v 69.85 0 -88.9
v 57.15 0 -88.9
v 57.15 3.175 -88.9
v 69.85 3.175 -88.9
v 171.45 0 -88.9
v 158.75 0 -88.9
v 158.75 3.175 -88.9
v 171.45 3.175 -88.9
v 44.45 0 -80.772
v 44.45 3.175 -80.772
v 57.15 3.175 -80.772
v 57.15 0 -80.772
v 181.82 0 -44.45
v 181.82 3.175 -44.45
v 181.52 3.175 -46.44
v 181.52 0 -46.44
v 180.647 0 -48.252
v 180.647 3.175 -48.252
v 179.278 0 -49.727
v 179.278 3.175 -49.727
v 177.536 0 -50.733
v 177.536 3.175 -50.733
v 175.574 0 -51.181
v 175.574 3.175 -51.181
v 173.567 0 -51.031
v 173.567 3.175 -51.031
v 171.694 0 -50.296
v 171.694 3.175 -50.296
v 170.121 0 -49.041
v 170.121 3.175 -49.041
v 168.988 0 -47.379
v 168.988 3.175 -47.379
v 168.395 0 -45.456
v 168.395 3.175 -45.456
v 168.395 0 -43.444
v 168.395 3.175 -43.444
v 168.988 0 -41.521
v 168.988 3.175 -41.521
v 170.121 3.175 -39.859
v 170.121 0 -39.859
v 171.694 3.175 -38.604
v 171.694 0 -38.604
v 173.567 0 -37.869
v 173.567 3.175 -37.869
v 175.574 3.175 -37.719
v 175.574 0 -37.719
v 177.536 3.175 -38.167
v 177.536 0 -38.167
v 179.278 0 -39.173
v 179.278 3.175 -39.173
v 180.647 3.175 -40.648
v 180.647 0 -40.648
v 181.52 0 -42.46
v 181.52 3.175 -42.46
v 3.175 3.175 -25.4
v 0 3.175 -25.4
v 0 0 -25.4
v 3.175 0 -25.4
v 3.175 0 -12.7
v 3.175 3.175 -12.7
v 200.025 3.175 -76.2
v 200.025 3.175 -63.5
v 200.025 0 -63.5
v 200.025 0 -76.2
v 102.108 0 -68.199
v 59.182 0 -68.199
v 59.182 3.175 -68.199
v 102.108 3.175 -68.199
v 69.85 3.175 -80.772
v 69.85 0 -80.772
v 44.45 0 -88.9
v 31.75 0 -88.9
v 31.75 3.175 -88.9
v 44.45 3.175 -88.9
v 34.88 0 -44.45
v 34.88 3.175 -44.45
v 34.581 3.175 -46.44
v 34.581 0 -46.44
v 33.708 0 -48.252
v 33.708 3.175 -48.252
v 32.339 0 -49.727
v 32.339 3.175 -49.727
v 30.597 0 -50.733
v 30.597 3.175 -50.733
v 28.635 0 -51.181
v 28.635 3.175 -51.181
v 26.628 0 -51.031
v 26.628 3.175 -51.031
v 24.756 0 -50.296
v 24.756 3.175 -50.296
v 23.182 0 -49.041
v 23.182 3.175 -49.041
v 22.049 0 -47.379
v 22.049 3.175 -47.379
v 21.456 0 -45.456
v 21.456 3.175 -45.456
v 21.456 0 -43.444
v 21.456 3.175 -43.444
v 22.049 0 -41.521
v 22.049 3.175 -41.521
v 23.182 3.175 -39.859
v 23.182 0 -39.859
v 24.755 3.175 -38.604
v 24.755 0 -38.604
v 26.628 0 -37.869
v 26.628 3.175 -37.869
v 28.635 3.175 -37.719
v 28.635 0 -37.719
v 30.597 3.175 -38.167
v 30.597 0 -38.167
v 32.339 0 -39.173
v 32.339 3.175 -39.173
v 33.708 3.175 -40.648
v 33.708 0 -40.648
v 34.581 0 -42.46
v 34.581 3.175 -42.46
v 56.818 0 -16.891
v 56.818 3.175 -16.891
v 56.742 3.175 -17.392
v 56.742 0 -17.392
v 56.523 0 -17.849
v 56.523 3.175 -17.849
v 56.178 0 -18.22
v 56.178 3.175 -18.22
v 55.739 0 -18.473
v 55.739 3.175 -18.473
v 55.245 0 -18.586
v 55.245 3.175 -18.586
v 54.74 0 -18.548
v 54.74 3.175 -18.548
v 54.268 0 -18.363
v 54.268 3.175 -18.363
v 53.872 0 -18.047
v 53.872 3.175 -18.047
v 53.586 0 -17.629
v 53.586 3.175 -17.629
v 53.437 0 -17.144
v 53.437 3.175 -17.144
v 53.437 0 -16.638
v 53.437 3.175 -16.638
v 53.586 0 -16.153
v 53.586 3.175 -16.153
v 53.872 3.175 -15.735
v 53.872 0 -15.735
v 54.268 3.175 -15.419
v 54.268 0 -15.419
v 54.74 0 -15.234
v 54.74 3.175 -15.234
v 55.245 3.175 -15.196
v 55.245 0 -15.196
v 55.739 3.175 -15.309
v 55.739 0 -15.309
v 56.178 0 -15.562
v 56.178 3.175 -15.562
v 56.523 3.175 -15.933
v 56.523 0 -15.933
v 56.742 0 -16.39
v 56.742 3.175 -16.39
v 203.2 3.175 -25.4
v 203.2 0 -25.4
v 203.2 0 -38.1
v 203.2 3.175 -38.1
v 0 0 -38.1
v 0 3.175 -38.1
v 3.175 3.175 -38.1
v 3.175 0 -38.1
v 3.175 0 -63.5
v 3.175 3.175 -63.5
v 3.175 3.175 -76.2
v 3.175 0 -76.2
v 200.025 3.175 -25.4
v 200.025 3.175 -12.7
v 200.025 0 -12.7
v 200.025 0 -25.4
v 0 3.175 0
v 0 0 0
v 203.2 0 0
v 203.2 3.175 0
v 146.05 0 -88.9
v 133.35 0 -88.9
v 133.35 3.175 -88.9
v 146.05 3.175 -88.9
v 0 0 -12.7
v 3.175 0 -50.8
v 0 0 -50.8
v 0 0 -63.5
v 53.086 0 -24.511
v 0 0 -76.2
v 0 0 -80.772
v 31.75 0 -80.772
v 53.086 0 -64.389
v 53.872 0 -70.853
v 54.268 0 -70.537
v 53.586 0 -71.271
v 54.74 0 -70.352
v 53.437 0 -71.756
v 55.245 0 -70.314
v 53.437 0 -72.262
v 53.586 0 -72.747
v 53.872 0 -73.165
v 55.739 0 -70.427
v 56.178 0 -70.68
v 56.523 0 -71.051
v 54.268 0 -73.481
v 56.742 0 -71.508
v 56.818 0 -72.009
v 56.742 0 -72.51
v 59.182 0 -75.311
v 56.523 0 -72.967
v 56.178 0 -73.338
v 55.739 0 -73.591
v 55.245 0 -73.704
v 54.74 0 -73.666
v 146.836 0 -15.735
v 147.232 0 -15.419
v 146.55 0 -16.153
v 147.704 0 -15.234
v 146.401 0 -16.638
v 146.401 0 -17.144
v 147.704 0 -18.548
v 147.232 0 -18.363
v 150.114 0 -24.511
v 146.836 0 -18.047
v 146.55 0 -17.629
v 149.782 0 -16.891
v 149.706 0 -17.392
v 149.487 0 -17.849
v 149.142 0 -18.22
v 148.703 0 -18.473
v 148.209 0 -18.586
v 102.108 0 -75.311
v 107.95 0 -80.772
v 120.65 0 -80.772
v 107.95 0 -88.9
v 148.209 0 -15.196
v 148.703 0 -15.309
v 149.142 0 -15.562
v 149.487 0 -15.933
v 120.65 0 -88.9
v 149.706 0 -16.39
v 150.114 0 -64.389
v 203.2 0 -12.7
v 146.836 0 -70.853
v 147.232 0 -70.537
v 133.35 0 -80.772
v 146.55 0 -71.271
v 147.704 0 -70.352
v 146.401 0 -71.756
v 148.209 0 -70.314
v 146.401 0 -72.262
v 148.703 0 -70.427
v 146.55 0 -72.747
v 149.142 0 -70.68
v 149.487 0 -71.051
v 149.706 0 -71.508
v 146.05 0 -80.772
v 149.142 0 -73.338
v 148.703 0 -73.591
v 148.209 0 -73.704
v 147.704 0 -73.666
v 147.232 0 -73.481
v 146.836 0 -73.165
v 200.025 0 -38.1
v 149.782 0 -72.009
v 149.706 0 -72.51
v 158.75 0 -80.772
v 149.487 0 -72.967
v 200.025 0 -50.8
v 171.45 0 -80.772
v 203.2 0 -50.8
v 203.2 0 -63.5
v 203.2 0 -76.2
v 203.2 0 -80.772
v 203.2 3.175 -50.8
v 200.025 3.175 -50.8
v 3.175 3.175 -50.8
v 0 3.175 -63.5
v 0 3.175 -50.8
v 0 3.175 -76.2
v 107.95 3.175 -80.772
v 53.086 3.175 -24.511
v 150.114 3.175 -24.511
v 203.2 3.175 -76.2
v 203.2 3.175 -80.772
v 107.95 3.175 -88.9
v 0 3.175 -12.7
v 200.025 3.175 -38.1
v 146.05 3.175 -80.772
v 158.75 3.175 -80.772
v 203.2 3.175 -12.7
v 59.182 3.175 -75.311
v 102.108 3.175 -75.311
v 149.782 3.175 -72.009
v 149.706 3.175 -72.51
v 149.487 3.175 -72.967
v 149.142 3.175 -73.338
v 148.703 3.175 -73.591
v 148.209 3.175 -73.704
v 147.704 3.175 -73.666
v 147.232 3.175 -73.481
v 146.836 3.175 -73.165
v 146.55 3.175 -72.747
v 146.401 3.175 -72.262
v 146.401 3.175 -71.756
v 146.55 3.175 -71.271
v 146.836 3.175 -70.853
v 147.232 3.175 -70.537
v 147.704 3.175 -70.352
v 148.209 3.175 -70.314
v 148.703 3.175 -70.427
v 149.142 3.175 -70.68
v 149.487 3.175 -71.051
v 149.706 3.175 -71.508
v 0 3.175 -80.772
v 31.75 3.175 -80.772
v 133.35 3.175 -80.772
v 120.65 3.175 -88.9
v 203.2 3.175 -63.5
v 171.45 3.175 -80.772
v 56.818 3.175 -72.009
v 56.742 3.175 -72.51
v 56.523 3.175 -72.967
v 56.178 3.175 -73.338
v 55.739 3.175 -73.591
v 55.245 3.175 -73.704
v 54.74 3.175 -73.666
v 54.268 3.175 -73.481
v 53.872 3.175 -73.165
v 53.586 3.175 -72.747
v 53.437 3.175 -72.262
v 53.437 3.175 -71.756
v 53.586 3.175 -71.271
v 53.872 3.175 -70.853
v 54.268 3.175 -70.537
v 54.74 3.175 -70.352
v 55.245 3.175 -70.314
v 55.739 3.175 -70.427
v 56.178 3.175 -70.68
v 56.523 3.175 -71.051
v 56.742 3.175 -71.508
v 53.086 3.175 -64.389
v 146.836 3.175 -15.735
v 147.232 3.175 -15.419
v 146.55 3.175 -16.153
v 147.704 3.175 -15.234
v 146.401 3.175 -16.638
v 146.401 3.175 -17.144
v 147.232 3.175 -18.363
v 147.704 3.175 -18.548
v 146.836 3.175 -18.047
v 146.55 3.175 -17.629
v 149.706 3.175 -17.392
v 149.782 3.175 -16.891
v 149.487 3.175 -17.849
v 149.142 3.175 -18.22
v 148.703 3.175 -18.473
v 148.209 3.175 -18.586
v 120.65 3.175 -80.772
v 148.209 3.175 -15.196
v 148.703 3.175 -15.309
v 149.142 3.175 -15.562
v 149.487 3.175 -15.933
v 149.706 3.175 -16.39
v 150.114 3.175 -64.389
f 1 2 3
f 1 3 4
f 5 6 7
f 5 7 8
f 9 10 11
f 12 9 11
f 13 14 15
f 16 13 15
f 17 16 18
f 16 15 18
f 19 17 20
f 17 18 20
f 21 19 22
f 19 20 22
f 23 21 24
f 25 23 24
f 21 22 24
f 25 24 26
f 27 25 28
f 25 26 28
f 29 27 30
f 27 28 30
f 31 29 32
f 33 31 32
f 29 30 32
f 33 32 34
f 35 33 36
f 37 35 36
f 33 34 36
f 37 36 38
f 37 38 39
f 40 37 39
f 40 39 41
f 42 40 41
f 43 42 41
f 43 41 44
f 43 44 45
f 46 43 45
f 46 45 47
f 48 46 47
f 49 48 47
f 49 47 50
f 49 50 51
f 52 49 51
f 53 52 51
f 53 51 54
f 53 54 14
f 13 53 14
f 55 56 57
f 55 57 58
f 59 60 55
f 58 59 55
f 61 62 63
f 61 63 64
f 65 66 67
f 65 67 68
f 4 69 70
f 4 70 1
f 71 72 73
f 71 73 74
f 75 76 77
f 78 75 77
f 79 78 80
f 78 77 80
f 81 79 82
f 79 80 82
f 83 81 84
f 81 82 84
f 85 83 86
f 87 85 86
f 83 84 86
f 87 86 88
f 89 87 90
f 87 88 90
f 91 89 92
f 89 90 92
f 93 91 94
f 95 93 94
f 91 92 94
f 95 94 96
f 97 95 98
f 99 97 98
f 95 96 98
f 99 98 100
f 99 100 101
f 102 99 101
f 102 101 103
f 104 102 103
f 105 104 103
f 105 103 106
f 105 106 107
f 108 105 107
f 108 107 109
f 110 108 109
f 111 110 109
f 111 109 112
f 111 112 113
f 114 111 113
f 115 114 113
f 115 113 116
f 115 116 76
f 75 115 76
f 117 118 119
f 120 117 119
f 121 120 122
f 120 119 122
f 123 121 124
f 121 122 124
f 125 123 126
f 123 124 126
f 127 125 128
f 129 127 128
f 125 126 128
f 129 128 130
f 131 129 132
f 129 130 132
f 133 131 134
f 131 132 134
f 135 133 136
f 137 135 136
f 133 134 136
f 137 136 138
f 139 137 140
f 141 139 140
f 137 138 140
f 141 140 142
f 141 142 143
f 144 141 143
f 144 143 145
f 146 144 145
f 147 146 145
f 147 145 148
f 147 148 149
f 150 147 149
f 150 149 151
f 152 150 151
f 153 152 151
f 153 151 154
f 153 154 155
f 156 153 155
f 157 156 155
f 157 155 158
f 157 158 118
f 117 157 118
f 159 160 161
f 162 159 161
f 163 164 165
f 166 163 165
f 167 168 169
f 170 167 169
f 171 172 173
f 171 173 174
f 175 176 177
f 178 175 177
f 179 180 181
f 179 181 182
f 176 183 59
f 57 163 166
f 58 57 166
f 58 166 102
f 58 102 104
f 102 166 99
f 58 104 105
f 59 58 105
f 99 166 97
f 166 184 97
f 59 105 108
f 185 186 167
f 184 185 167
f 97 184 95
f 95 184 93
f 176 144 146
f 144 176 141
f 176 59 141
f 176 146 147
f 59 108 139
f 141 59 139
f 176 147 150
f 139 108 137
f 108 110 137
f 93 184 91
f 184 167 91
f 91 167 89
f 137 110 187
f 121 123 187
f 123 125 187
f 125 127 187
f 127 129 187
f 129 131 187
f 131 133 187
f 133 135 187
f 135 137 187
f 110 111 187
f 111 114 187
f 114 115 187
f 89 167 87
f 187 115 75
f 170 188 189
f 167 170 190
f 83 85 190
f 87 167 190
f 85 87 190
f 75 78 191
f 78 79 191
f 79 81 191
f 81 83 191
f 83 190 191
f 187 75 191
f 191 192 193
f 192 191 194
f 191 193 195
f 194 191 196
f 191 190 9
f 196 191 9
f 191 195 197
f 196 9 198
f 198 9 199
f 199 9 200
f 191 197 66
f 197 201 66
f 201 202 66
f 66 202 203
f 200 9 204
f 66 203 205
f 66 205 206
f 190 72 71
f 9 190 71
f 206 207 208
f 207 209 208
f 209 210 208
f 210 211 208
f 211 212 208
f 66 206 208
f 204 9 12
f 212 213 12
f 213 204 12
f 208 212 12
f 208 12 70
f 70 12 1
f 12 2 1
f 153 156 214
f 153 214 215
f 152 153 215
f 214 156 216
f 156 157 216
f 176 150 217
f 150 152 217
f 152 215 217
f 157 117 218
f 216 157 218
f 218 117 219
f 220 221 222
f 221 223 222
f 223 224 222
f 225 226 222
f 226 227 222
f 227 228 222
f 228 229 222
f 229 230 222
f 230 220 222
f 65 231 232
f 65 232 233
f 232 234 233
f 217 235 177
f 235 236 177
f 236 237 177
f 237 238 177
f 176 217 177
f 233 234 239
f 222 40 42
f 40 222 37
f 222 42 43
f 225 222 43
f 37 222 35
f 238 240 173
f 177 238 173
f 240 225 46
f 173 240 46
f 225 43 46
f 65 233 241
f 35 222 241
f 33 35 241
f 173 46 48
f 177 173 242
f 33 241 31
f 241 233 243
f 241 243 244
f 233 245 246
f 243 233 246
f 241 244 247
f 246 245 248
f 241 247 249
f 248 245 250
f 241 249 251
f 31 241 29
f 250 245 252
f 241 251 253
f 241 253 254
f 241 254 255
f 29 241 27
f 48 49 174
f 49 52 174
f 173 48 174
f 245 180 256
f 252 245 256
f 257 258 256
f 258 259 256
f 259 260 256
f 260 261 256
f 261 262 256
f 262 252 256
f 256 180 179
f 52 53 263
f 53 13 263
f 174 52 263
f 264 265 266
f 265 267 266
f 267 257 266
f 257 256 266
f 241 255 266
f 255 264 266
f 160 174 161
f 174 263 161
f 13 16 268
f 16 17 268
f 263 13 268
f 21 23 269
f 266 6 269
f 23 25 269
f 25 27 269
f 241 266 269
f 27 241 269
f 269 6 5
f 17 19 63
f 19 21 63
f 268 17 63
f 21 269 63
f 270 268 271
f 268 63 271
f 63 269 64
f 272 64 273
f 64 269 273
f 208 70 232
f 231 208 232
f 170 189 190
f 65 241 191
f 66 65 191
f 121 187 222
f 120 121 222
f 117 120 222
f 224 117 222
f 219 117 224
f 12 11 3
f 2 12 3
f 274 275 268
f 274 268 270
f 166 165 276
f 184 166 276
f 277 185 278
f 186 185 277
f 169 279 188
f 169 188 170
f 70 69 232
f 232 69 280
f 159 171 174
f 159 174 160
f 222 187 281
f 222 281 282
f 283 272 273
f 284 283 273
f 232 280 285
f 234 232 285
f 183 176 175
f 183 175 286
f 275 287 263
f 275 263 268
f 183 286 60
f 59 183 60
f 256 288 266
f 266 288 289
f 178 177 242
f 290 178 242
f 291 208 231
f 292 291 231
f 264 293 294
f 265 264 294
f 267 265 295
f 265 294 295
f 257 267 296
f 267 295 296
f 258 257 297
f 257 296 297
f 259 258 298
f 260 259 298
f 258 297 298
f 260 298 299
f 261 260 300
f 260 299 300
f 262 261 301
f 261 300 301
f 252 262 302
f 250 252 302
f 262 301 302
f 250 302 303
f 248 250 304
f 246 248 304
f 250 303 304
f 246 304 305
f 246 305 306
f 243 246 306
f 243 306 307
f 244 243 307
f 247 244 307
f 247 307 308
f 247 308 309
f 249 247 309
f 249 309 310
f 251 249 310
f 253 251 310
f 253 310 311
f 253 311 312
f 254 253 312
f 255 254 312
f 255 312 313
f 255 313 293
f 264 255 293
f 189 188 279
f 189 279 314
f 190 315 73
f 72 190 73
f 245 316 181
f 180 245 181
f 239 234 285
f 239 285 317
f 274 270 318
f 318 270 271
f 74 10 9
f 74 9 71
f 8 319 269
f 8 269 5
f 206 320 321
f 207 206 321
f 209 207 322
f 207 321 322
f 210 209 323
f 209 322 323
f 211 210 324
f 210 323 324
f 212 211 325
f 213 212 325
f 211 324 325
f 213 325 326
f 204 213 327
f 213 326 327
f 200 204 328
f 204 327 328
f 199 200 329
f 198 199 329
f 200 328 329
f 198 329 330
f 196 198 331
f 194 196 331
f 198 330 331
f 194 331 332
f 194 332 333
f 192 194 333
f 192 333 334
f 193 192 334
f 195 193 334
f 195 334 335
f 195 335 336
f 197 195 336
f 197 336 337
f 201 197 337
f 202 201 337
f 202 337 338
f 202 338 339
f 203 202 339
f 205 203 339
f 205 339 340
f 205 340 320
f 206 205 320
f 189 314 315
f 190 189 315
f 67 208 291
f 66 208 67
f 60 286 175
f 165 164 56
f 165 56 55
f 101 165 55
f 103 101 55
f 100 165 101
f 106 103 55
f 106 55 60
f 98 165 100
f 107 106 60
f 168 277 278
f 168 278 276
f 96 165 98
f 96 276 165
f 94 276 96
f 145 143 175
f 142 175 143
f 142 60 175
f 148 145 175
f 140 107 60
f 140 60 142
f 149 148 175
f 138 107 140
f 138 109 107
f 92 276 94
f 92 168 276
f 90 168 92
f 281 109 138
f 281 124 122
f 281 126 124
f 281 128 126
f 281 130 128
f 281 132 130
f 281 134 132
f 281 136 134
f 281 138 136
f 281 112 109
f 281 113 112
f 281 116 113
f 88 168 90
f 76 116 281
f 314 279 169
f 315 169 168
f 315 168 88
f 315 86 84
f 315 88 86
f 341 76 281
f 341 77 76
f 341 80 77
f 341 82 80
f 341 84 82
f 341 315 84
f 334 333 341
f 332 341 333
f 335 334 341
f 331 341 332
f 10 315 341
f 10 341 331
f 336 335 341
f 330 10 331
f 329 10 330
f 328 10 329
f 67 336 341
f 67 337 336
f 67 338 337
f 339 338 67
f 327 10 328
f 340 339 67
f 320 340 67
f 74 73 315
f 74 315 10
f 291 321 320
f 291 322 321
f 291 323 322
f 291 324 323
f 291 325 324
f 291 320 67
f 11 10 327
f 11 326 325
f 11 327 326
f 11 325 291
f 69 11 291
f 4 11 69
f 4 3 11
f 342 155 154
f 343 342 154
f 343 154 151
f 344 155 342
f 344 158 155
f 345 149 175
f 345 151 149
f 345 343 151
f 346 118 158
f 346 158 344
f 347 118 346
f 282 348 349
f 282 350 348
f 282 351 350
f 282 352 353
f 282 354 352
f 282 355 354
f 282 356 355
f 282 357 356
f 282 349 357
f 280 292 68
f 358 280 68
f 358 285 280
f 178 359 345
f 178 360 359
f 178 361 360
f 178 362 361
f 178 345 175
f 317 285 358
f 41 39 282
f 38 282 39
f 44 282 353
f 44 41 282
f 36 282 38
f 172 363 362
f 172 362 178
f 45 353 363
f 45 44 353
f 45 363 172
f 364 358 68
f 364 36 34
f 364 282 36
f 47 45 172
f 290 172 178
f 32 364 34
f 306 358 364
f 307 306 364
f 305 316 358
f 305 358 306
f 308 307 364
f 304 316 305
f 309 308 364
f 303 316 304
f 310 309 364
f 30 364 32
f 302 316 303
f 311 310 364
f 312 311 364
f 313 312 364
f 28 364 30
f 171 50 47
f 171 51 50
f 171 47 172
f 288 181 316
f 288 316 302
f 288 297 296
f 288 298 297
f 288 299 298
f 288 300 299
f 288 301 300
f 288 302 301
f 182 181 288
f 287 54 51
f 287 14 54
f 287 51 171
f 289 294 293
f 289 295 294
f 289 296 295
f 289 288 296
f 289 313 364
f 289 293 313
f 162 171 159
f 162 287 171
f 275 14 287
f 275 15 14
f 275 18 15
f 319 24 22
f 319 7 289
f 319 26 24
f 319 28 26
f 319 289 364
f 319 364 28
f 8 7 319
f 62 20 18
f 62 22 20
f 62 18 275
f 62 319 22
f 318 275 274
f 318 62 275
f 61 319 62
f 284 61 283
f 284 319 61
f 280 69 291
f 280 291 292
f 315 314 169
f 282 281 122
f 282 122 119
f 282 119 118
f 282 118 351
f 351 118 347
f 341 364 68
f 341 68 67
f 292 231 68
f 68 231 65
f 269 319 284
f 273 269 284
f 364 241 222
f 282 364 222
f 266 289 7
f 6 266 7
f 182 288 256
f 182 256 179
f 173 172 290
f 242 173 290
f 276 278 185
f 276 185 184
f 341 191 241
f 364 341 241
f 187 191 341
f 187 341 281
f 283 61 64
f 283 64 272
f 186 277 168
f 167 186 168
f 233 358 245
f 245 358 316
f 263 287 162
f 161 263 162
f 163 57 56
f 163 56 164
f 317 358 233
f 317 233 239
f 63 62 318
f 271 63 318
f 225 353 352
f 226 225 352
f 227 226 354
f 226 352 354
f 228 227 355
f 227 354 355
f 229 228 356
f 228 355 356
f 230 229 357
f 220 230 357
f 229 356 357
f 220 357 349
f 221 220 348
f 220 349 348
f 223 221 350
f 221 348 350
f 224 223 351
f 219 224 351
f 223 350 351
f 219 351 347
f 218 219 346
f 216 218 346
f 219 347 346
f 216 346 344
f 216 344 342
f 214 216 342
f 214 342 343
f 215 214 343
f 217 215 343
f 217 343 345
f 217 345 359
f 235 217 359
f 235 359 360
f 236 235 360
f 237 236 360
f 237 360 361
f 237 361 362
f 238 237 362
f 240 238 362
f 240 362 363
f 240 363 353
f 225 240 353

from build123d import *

# Parameters (mm, degrees)
SKETCH1_W             = 203.2
SKETCH1_H             = 88.9
BOSS_EXTRUDE1_DEPTH   = 3.175
SKETCH2_W             = 31.75
SKETCH2_H             = 8.128
SKETCH2_W_2           = 3.175
SKETCH2_H_2           = 12.7
SKETCH2_W_3           = 12.7
SKETCH2_W_4           = 38.1
CUT_EXTRUDE1_DEPTH    = 222.818688629
SKETCH3_W             = 97.028
SKETCH3_H             = 39.878
SKETCH3_W_2           = 42.926
SKETCH3_H_2           = 7.112
CUT_EXTRUDE2_DEPTH    = 222.818688629
M3_CLEARANCE_HOLE1_D  = 3.4
M12_CLEARANCE_HOLE1_D = 13.5


with BuildPart() as part:
    # Sketch1 → Boss-Extrude1 (new body)
    with BuildSketch(Plane(origin=(0, 0, 0), x_dir=(1, 0, 0), z_dir=(0, 1, 0))):
        with Locations((101.6, 44.45)):
            Rectangle(SKETCH1_W, SKETCH1_H)
    extrude(amount=BOSS_EXTRUDE1_DEPTH)

    # Sketch2 → Cut-Extrude1 (cut, through all)
    with BuildSketch(Plane(origin=(0, 3.175, 0), x_dir=(1, 0, 0), z_dir=(0, 1, 0))):
        with Locations((15.875, 84.836)):
            Rectangle(SKETCH2_W, SKETCH2_H)
        with Locations((1.5875, 44.45)):
            Rectangle(SKETCH2_W_2, SKETCH2_H_2)
        with Locations((1.5875, 69.85)):
            Rectangle(SKETCH2_W_2, SKETCH2_H_2)
        with Locations((1.5875, 19.05)):
            Rectangle(SKETCH2_W_2, SKETCH2_H_2)
        with Locations((50.8, 84.836)):
            Rectangle(SKETCH2_W_3, SKETCH2_H)
        with Locations((88.9, 84.836)):
            Rectangle(SKETCH2_W_4, SKETCH2_H)
        with Locations((127, 84.836)):
            Rectangle(SKETCH2_W_3, SKETCH2_H)
        with Locations((152.4, 84.836)):
            Rectangle(SKETCH2_W_3, SKETCH2_H)
        with Locations((187.325, 84.836)):
            Rectangle(SKETCH2_W, SKETCH2_H)
        with Locations((201.6125, 19.05)):
            Rectangle(SKETCH2_W_2, SKETCH2_H_2)
        with Locations((201.6125, 44.45)):
            Rectangle(SKETCH2_W_2, SKETCH2_H_2)
        with Locations((201.6125, 69.85)):
            Rectangle(SKETCH2_W_2, SKETCH2_H_2)
    extrude(amount=-CUT_EXTRUDE1_DEPTH, mode=Mode.SUBTRACT)

    # Sketch3 → Cut-Extrude2 (cut, through all)
    with BuildSketch(Plane.XZ):
        with Locations((101.6, -44.45)):
            Rectangle(SKETCH3_W, SKETCH3_H)
        with Locations((80.645, -71.755)):
            Rectangle(SKETCH3_W_2, SKETCH3_H_2)
    extrude(amount=-CUT_EXTRUDE2_DEPTH, mode=Mode.SUBTRACT)

    # M3 Clearance Hole1 (through all)
    with Locations(Plane(origin=(0, 0, 0), x_dir=(-1, 0, 0), z_dir=(0, -1, 0))):
        with Locations((-148.082, 72.009), (-148.082, 16.891), (-55.118, 16.891), (-55.118, 72.009)):
            Hole(M3_CLEARANCE_HOLE1_D / 2)

    # M12 Clearance Hole1 (through all)
    with Locations(Plane(origin=(0, 0, 0), x_dir=(-1, 0, 0), z_dir=(0, -1, 0))):
        with Locations((-175.0695, 44.45), (-28.1305, 44.45)):
            Hole(M12_CLEARANCE_HOLE1_D / 2)


solid = part.part
